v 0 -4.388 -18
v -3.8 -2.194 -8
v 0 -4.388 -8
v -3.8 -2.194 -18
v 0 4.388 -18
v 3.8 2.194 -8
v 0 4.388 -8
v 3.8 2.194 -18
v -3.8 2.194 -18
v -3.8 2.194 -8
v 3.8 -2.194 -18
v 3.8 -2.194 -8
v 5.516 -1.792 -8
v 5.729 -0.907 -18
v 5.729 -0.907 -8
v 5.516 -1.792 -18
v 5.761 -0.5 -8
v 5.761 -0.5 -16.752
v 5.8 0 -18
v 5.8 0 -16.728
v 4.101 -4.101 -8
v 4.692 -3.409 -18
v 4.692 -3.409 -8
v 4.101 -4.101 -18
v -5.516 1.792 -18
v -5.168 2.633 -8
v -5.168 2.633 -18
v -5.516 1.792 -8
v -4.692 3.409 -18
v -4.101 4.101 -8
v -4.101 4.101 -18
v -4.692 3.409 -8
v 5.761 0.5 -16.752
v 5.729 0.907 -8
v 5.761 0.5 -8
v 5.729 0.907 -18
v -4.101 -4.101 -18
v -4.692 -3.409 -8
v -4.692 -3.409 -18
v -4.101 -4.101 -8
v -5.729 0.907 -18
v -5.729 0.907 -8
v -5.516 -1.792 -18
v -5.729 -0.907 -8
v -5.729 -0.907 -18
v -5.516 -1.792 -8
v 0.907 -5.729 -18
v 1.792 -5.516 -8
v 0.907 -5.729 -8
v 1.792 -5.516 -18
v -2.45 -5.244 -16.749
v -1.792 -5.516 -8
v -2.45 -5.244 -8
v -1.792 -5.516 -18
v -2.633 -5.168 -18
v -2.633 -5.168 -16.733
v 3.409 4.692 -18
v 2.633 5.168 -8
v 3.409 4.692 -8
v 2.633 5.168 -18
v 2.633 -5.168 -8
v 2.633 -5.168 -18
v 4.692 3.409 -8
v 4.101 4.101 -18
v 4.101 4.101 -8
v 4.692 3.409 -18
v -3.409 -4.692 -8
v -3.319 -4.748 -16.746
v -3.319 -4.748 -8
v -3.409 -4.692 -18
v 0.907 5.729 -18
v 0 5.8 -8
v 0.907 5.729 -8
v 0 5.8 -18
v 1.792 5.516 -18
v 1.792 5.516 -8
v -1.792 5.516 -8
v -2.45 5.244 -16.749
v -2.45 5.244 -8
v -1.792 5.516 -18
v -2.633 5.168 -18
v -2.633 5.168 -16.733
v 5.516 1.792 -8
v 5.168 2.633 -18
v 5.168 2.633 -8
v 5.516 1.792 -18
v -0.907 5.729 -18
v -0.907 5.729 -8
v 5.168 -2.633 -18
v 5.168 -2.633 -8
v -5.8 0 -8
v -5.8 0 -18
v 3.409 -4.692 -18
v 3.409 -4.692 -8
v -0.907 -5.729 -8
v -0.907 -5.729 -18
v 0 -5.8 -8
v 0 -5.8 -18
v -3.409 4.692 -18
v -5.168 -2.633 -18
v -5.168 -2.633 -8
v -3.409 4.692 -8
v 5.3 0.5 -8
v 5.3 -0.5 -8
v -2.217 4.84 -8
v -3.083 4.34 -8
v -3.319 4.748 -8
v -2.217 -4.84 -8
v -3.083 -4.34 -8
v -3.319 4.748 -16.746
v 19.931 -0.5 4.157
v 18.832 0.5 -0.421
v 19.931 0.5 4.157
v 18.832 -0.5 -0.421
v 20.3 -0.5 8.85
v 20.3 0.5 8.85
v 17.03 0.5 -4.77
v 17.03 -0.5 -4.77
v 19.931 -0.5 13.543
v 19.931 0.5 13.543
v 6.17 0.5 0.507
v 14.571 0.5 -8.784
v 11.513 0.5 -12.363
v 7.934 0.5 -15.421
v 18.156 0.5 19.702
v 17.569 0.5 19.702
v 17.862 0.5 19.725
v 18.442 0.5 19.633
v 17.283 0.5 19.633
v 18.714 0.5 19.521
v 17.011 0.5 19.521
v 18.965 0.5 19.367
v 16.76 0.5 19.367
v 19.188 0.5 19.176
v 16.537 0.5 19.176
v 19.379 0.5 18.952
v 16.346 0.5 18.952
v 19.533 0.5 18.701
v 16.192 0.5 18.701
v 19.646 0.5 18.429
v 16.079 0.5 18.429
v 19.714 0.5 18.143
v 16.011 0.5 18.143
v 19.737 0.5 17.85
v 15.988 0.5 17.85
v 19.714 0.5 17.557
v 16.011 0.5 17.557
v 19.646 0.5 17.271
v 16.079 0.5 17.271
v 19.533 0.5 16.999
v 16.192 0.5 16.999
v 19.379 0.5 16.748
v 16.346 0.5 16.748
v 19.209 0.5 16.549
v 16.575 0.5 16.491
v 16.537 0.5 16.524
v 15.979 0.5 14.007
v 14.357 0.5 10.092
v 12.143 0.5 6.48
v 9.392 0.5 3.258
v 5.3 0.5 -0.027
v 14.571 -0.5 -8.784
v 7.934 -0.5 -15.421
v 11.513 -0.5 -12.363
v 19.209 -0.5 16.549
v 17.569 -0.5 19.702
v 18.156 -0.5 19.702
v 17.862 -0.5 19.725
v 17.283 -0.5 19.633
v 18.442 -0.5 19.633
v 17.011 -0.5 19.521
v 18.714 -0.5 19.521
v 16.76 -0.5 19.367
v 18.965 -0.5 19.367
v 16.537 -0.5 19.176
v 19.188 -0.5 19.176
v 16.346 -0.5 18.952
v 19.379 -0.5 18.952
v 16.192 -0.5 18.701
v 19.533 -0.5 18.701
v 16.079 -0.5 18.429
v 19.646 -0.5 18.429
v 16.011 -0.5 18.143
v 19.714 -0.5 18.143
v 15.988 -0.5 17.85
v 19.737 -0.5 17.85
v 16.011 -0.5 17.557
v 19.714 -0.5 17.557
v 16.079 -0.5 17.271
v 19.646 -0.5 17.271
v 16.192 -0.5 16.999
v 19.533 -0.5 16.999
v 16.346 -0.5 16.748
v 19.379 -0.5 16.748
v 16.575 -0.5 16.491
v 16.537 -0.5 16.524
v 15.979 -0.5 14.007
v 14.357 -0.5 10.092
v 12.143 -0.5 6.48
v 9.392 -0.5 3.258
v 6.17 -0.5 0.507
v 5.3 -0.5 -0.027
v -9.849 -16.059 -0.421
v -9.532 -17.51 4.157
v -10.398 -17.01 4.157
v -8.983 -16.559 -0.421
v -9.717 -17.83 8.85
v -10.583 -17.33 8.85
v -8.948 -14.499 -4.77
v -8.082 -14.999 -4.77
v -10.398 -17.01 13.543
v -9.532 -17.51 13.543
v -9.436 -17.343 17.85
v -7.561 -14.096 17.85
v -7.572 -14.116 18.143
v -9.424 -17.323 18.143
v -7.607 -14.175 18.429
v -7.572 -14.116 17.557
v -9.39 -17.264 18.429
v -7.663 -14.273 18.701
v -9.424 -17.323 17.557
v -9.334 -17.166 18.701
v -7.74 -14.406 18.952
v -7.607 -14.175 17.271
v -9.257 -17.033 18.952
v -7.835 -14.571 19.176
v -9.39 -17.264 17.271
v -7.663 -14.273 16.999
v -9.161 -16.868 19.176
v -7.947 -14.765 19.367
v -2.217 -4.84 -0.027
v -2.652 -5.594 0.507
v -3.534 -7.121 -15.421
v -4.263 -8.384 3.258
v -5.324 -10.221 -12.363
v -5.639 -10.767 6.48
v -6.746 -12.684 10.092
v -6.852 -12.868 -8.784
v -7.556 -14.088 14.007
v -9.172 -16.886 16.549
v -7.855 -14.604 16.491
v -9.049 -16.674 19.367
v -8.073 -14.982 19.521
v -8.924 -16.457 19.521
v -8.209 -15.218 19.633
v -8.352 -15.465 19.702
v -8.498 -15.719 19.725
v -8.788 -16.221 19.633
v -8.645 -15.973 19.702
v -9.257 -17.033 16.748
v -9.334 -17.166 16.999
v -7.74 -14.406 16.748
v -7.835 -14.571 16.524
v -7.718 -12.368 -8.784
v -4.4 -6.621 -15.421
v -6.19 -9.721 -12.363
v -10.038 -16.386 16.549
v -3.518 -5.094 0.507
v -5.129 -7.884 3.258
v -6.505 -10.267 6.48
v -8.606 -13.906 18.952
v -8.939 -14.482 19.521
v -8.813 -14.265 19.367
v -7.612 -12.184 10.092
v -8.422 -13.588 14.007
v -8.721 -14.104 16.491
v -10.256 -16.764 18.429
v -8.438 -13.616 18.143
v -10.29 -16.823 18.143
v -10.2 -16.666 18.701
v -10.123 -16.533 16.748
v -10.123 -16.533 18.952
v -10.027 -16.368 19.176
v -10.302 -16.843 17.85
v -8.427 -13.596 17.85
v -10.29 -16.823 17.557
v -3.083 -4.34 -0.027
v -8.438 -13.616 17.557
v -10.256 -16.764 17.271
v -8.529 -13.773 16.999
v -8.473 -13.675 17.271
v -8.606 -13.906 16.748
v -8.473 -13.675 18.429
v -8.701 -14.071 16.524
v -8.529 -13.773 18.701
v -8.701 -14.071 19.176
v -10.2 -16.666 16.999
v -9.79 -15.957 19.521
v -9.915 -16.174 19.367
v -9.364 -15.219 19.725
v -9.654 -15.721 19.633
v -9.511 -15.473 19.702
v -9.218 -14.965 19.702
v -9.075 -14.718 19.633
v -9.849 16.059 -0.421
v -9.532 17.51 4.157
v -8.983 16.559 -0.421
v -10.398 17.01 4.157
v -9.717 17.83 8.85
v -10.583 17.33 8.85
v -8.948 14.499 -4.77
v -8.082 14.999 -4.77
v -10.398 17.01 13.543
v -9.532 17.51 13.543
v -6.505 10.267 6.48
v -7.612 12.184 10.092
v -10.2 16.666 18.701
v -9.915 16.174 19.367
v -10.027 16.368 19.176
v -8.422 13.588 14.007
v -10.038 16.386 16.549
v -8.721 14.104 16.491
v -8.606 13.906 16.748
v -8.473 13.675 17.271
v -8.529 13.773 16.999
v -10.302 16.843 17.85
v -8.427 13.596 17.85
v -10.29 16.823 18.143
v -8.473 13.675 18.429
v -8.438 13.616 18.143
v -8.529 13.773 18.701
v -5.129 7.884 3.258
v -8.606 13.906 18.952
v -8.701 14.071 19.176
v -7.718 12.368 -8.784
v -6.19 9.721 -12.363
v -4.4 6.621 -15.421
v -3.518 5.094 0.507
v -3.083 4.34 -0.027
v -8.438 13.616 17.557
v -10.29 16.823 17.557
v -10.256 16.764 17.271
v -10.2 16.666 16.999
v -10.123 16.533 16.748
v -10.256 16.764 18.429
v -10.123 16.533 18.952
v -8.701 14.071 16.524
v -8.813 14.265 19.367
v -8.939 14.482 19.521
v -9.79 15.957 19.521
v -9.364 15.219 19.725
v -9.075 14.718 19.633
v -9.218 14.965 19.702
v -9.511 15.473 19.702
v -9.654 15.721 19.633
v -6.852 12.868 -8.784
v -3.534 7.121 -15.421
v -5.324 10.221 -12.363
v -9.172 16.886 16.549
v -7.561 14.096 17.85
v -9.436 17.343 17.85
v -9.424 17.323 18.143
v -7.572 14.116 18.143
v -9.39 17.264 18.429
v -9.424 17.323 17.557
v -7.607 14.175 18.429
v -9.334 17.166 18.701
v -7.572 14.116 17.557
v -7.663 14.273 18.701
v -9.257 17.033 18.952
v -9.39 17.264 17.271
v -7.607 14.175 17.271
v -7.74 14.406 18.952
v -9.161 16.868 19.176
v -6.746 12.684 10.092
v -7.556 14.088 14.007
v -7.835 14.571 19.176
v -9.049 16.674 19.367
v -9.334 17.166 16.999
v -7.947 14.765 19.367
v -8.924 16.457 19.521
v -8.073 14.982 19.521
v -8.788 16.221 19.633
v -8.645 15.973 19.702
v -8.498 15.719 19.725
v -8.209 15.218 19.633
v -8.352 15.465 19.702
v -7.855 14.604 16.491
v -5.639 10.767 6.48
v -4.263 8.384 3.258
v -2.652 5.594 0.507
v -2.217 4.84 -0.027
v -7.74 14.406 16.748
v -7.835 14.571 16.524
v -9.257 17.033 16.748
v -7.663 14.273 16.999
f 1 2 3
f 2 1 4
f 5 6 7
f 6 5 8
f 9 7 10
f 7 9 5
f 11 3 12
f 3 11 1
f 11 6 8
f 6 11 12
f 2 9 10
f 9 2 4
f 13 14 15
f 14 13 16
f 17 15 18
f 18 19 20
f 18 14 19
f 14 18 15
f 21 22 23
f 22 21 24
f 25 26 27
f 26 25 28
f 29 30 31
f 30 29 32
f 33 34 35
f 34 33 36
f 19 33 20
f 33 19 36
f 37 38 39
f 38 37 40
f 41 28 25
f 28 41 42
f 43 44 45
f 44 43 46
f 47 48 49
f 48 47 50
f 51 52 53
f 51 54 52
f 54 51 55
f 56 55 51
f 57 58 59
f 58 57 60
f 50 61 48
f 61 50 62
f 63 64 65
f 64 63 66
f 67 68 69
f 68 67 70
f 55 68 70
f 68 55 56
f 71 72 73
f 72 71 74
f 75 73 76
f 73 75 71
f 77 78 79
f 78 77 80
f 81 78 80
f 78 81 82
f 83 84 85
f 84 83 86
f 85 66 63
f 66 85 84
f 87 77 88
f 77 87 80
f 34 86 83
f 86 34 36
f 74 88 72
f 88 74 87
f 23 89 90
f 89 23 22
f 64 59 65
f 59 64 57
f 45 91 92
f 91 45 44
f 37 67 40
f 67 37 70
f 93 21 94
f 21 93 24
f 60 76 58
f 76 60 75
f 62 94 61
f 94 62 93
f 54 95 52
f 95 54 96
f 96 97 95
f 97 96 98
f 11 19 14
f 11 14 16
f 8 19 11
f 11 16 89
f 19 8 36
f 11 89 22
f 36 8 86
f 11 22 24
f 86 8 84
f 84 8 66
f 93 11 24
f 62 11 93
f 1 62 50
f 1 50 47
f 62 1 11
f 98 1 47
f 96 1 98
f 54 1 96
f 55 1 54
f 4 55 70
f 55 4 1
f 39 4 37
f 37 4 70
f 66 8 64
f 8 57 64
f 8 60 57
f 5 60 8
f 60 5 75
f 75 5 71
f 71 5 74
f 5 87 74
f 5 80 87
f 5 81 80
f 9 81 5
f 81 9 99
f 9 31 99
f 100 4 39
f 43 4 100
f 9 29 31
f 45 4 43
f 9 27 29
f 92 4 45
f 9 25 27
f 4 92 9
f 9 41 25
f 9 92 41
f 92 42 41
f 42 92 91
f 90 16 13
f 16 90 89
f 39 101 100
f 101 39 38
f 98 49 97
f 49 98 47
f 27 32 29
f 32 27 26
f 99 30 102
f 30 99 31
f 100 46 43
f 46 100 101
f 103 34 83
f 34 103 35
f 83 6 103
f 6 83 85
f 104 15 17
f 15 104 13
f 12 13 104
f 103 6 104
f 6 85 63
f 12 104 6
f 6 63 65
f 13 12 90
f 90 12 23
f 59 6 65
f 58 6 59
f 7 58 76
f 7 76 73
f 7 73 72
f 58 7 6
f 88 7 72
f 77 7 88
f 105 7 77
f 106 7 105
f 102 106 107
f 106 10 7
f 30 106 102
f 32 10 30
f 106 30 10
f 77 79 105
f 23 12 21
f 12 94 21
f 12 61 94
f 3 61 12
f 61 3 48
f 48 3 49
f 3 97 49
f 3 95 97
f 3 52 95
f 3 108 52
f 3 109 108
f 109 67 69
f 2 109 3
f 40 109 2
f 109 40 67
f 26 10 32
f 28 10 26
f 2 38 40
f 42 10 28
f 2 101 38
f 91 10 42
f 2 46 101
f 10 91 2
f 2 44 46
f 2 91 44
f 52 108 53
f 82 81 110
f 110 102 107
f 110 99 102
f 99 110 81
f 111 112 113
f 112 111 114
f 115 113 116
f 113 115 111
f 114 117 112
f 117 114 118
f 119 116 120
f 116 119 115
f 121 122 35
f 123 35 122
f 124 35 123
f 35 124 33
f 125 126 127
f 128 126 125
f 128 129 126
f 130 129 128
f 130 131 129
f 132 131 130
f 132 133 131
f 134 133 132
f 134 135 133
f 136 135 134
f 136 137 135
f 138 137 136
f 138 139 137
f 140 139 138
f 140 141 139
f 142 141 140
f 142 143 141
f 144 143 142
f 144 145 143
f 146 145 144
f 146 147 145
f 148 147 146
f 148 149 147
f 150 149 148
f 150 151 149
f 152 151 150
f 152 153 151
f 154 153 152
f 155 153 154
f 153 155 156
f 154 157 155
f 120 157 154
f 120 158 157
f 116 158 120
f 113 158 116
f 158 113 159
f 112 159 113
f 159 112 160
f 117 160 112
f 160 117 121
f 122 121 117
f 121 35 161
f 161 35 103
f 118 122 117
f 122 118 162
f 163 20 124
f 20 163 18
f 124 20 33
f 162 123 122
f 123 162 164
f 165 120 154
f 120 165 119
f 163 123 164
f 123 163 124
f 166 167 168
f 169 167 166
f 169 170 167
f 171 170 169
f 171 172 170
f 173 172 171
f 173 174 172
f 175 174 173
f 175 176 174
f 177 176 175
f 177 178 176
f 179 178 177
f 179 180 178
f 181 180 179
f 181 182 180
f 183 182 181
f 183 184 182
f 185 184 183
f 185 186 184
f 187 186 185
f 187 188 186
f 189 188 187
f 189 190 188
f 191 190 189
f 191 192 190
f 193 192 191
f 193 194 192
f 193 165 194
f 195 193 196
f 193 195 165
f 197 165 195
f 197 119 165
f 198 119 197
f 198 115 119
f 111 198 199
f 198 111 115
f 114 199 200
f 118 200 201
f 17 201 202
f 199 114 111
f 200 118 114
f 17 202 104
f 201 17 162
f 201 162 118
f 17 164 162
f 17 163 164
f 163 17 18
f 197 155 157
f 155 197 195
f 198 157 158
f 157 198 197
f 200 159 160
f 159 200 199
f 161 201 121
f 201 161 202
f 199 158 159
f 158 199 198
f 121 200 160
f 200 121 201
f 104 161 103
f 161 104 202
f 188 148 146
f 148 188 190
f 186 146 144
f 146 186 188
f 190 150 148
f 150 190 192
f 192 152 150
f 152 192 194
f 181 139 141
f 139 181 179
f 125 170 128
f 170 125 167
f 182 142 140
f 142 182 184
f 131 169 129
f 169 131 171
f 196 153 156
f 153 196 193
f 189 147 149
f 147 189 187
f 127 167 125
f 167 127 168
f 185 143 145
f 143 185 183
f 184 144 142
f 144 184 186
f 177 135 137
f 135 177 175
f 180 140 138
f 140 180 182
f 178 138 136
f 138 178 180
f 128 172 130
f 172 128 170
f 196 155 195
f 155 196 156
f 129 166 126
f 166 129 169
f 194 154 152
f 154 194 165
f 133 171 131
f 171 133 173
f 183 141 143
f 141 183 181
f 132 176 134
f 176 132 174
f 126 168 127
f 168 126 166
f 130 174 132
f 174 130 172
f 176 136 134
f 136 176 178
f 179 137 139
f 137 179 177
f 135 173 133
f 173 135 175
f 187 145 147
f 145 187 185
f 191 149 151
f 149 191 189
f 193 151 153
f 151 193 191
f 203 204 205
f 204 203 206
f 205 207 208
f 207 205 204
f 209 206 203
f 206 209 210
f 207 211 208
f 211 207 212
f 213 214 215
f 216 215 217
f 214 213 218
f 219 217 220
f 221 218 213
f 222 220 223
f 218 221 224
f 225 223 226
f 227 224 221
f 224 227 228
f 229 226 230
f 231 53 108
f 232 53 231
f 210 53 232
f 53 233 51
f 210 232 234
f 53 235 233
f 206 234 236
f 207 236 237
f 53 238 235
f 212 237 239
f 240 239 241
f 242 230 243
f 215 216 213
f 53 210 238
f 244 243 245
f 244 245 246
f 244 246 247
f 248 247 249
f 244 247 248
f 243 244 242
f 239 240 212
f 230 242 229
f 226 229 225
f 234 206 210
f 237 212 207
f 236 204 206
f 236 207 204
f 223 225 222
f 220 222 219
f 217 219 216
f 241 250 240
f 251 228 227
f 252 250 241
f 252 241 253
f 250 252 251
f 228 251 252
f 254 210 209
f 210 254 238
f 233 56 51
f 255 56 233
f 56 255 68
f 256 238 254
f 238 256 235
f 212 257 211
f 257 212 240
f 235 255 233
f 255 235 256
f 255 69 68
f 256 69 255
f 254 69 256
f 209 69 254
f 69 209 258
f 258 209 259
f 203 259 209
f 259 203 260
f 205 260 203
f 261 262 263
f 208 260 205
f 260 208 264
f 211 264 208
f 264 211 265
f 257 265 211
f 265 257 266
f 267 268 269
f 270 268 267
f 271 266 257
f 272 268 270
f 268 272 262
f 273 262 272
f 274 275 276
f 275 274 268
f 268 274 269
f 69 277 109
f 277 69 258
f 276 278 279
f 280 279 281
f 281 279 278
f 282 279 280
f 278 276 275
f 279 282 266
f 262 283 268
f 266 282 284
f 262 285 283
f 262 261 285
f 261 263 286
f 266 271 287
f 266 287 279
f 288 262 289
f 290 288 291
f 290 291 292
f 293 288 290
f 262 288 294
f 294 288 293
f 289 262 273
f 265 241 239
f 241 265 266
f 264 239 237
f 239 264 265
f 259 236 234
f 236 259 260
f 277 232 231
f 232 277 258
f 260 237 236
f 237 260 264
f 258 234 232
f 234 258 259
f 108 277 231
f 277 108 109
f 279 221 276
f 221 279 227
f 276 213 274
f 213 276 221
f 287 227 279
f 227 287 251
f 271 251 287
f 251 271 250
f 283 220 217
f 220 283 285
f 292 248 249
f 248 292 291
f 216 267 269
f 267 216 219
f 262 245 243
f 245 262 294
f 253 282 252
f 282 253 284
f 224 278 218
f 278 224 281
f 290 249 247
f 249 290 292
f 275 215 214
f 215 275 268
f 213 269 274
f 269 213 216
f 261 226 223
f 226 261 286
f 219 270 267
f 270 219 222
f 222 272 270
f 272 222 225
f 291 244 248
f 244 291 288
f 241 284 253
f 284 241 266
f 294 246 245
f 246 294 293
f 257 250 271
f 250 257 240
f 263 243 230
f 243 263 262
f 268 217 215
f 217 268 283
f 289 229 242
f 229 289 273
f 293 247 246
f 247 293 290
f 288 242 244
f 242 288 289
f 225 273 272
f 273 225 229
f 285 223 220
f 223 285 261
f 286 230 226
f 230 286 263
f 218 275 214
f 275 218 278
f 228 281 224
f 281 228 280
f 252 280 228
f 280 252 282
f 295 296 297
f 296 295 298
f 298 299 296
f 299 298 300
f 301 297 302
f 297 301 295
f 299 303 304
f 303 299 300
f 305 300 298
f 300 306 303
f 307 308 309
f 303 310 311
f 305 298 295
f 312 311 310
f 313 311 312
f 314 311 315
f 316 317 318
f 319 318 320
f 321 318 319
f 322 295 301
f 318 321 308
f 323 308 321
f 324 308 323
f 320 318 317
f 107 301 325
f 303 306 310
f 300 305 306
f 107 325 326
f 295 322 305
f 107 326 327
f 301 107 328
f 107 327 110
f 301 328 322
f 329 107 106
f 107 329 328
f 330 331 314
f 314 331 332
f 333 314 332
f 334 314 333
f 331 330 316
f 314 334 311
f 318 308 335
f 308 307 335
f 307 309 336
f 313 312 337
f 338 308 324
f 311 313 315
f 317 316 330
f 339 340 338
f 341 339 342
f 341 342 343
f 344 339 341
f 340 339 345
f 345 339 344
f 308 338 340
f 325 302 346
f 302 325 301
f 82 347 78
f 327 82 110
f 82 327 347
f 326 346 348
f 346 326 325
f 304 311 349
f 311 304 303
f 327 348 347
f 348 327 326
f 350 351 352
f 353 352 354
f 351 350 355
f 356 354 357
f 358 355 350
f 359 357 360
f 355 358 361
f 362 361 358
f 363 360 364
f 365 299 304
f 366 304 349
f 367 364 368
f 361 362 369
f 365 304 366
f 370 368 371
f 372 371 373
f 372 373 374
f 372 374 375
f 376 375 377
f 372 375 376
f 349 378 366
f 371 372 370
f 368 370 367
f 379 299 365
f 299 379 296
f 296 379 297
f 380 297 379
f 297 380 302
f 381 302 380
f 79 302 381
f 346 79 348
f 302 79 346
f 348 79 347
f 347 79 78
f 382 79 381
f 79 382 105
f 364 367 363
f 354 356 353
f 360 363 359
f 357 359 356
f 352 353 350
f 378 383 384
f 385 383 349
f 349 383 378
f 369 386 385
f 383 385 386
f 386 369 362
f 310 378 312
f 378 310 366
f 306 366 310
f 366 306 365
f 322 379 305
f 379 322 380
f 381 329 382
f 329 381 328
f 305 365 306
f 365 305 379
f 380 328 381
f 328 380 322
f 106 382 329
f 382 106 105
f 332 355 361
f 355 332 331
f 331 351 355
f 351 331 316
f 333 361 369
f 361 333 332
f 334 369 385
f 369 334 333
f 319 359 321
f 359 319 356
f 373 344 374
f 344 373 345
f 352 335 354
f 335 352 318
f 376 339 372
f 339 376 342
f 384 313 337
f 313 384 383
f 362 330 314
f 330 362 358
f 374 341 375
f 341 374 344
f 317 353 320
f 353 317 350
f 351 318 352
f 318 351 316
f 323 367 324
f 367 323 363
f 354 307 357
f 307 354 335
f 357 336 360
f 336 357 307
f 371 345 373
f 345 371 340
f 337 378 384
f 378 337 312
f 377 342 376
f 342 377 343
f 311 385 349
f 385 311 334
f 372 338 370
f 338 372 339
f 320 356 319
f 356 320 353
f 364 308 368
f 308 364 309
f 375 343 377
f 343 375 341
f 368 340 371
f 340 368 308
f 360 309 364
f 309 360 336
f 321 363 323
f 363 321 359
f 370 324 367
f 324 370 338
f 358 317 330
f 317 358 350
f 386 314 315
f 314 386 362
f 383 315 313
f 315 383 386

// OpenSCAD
/*
 * Convertible Pencil Rocket / Pencil Stand
 *
 * by Alex Franke (CodeCreations), Nov 2012
 * http://www.theFrankes.com
 * 
 * Licenced under Creative Commons Attribution - Non-Commercial - Share Alike 3.0 
 * 
 * INSTRUCTIONS: Choose some values in the "User-defined values" section, render, and print. 
 * 
 * v1.00, Nov 28, 2012: Initial Release.
 *
 * TODO: 
 *   * Nothing at this time. 
 */

finThickness     = 1;    // Thickness of fins
finCount         = 3;    // Number of fins
finInset         = 0.5;  // Distance fins are inset from surface
finScale         = 0.75; // Scale the fins larger (>1) or smaller (<1)
pencilInDiameter = 7.6;  // Diameter of pencil (flat to flat for hex) 6.85 == Ticonderoga #2
bandThickness    = 2;    // The maximum thickness of the band the fins are attached to 
bandHeight       = 10;   // The height of the band
bandTranslation  = 8;    // The distance the band is translated toward the top of the fins

$fn              = 40;   // Overall curve quality

up = [180,0,0];


module pencilRocket()
{
	rotate(up) 
		union() 
		{
			pencilBase();	
			fins();
		}
}

module pencilBase()
{
	translate([0,0,bandTranslation]) 
				difference() 
				{
					cylinder(h=bandHeight, r=pencilInDiameter/2+bandThickness);
	
					translate([0,0,(bandHeight)/2]) 
						rotate([0,0,30]) 
							nut();
	
				}
}

module fins()
{
	for( i=[0:finCount-1] ) 
	{	
		rotate([0,0,(360/finCount)*i]) 
			translate([pencilInDiameter/2+bandThickness-finInset, 0, 0]) 
				rotate([90,0,0]) 
					scale([finScale,finScale,1]) 
						fin(); 	
	}
}

module fin() {
	translate([-20,-11.8,0]) 
	union() {
		difference() { 
			cylinder(h=finThickness, r=40, center=true);
			
			translate([0,-18,0]) 
				cylinder(h=finThickness+1, r=36, center=true);
	
			translate([-25,0,0]) 
				cube([90,90,finThickness+1], center=true);

			translate([36,-16,0]) 
				cube([10,10,finThickness+1], center=true);
		}

		translate([36.75,-12,0]) 
			cylinder(h=finThickness, r=2.5, center=true);
	}
}

function nutSide(diameter) = diameter * tan( 180/6 );

module nut() 
{
 	cubes = 2;

	nutHeigthCorrector = 1;

	nutHeigth = bandHeight + nutHeigthCorrector;
	side = nutSide(pencilInDiameter);

	degrees = 120;
	axisZ = [0, 0, 1];

	for ( i = [0 : cubes] ) 
	{
		rotate( i*degrees, axisZ) 
			cube( [side, pencilInDiameter, nutHeigth], center=true );
	}	
}

pencilRocket();
